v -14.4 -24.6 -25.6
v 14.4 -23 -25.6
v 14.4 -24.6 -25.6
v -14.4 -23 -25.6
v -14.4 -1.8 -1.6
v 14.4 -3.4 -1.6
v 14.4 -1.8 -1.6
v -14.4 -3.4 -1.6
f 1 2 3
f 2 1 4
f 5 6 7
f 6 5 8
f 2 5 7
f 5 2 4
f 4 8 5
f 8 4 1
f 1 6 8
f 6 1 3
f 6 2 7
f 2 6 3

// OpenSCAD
// file: ../p/4-4edge.scad
use <../lib.scad>
$fa=1; $fs=0.2;
function ldraw_lib__4_4edge(realsolid=false) = [
// 0 Circle 1.0
// 0 Name: 4-4edge.dat
// 0 Author: James Jessiman
// 0 !LDRAW_ORG Primitive UPDATE 2017-01
// 0 !LICENSE Licensed under CC BY 2.0 and CC BY 4.0 : see CAreadme.txt
// 
// 0 BFC CERTIFY CCW
  [0,"BFC","CERTIFY"],
  [0,"BFC","CCW"],
// 
// 0 !HISTORY 1998-12-15 [PTadmin] Official Update 1998-10
// 0 !HISTORY 2005-12-28 [PTadmin] Official Update 2005-01
// 0 !HISTORY 2007-06-24 [PTadmin] Header formatted for Contributor Agreement
// 0 !HISTORY 2008-07-01 [PTadmin] Official Update 2008-01
// 0 !HISTORY 2017-01-15 [Steffen] BFCed
// 0 !HISTORY 2017-12-30 [PTadmin] Official Update 2017-01
// 
// 
// 2 24 1 0 0 0.9239 0 0.3827
  [2,24,1,0,0,0.9239,0,0.3827],
// 2 24 0.9239 0 0.3827 0.7071 0 0.7071
  [2,24,0.9239,0,0.3827,0.7071,0,0.7071],
// 2 24 0.7071 0 0.7071 0.3827 0 0.9239
  [2,24,0.7071,0,0.7071,0.3827,0,0.9239],
// 2 24 0.3827 0 0.9239 0 0 1
  [2,24,0.3827,0,0.9239,0,0,1],
// 2 24 0 0 1 -0.3827 0 0.9239
  [2,24,0,0,1,-0.3827,0,0.9239],
// 2 24 -0.3827 0 0.9239 -0.7071 0 0.7071
  [2,24,-0.3827,0,0.9239,-0.7071,0,0.7071],
// 2 24 -0.7071 0 0.7071 -0.9239 0 0.3827
  [2,24,-0.7071,0,0.7071,-0.9239,0,0.3827],
// 2 24 -0.9239 0 0.3827 -1 0 -0
  [2,24,-0.9239,0,0.3827,-1,0,-0],
// 2 24 -1 0 -0 -0.9239 0 -0.3827
  [2,24,-1,0,-0,-0.9239,0,-0.3827],
// 2 24 -0.9239 0 -0.3827 -0.7071 0 -0.7071
  [2,24,-0.9239,0,-0.3827,-0.7071,0,-0.7071],
// 2 24 -0.7071 0 -0.7071 -0.3827 0 -0.9239
  [2,24,-0.7071,0,-0.7071,-0.3827,0,-0.9239],
// 2 24 -0.3827 0 -0.9239 0 0 -1
  [2,24,-0.3827,0,-0.9239,0,0,-1],
// 2 24 0 0 -1 0.3827 0 -0.9239
  [2,24,0,0,-1,0.3827,0,-0.9239],
// 2 24 0.3827 0 -0.9239 0.7071 0 -0.7071
  [2,24,0.3827,0,-0.9239,0.7071,0,-0.7071],
// 2 24 0.7071 0 -0.7071 0.9239 0 -0.3827
  [2,24,0.7071,0,-0.7071,0.9239,0,-0.3827],
// 2 24 0.9239 0 -0.3827 1 0 0
  [2,24,0.9239,0,-0.3827,1,0,0],
];
module ldraw_lib__4_4edge(step=0, col=false, unit=2/5, alt=false, line=0.2, solid=!$preview)
    makepoly(ldraw_lib__4_4edge(solid), step=step, col=col, unit=unit, alt=alt, line=line, solid=solid);
ldraw_lib__4_4edge(line=0.2);
// file: ../p/4-4disc.scad
use <../lib.scad>
$fa=1; $fs=0.2;
function ldraw_lib__4_4disc(realsolid=false) = [
// 0 Disc 1.0
// 0 Name: 4-4disc.dat
// 0 Author: James Jessiman
// 0 !LDRAW_ORG Primitive UPDATE 2002-02
// 0 !LICENSE Licensed under CC BY 2.0 and CC BY 4.0 : see CAreadme.txt
// 
// 0 BFC CERTIFY CCW
  [0,"BFC","CERTIFY"],
  [0,"BFC","CCW"],
// 
// 0 !HISTORY 1998-12-15 [PTadmin] Official Update 1998-10
// 0 !HISTORY 2002-03-23 [sbliss] Added BFC statement
// 0 !HISTORY 2002-04-25 [PTadmin] Official Update 2002-02
// 0 !HISTORY 2007-06-24 [PTadmin] Header formatted for Contributor Agreement
// 0 !HISTORY 2008-07-01 [PTadmin] Official Update 2008-01
// 
// 
// 3 16 0 0 0 1 0 0 0.9239 0 0.3827
  [3,16,0,0,0,1,0,0,0.9239,0,0.3827],
// 3 16 0 0 0 0.9239 0 0.3827 0.7071 0 0.7071
  [3,16,0,0,0,0.9239,0,0.3827,0.7071,0,0.7071],
// 3 16 0 0 0 0.7071 0 0.7071 0.3827 0 0.9239
  [3,16,0,0,0,0.7071,0,0.7071,0.3827,0,0.9239],
// 3 16 0 0 0 0.3827 0 0.9239 0 0 1
  [3,16,0,0,0,0.3827,0,0.9239,0,0,1],
// 3 16 0 0 0 0 0 1 -0.3827 0 0.9239
  [3,16,0,0,0,0,0,1,-0.3827,0,0.9239],
// 3 16 0 0 0 -0.3827 0 0.9239 -0.7071 0 0.7071
  [3,16,0,0,0,-0.3827,0,0.9239,-0.7071,0,0.7071],
// 3 16 0 0 0 -0.7071 0 0.7071 -0.9239 0 0.3827
  [3,16,0,0,0,-0.7071,0,0.7071,-0.9239,0,0.3827],
// 3 16 0 0 0 -0.9239 0 0.3827 -1 0 -0
  [3,16,0,0,0,-0.9239,0,0.3827,-1,0,-0],
// 3 16 0 0 0 -1 0 -0 -0.9239 0 -0.3827
  [3,16,0,0,0,-1,0,-0,-0.9239,0,-0.3827],
// 3 16 0 0 0 -0.9239 0 -0.3827 -0.7071 0 -0.7071
  [3,16,0,0,0,-0.9239,0,-0.3827,-0.7071,0,-0.7071],
// 3 16 0 0 0 -0.7071 0 -0.7071 -0.3827 0 -0.9239
  [3,16,0,0,0,-0.7071,0,-0.7071,-0.3827,0,-0.9239],
// 3 16 0 0 0 -0.3827 0 -0.9239 0 0 -1
  [3,16,0,0,0,-0.3827,0,-0.9239,0,0,-1],
// 3 16 0 0 0 0 0 -1 0.3827 0 -0.9239
  [3,16,0,0,0,0,0,-1,0.3827,0,-0.9239],
// 3 16 0 0 0 0.3827 0 -0.9239 0.7071 0 -0.7071
  [3,16,0,0,0,0.3827,0,-0.9239,0.7071,0,-0.7071],
// 3 16 0 0 0 0.7071 0 -0.7071 0.9239 0 -0.3827
  [3,16,0,0,0,0.7071,0,-0.7071,0.9239,0,-0.3827],
// 3 16 0 0 0 0.9239 0 -0.3827 1 0 0
  [3,16,0,0,0,0.9239,0,-0.3827,1,0,0],
// 0
];
module ldraw_lib__4_4disc(step=0, col=false, unit=2/5, alt=false, line=0.2, solid=!$preview)
    makepoly(ldraw_lib__4_4disc(solid), step=step, col=col, unit=unit, alt=alt, line=line, solid=solid);
ldraw_lib__4_4disc(line=0.2);
// file: ../p/4-4cyli.scad
use <../lib.scad>
$fa=1; $fs=0.2;
function ldraw_lib__4_4cyli(realsolid=false) = [
// 0 Cylinder 1.0
// 0 Name: 4-4cyli.dat
// 0 Author: James Jessiman
// 0 !LDRAW_ORG Primitive UPDATE 2005-01
// 0 !LICENSE Licensed under CC BY 2.0 and CC BY 4.0 : see CAreadme.txt
// 
// 0 BFC CERTIFY CCW
  [0,"BFC","CERTIFY"],
  [0,"BFC","CCW"],
// 
// 0 !HISTORY 1998-12-15 [PTadmin] Official Update 1998-10
// 0 !HISTORY 2002-03-23 [sbliss] Added BFC statement; merged headers from files in distributions LDraw 0.27 and Complete.
// 0 !HISTORY 2002-04-25 [PTadmin] Official Update 2002-02
// 0 !HISTORY 2004-12-14 [guyvivan] BFC CCW
// 0 !HISTORY 2005-12-28 [PTadmin] Official Update 2005-01
// 0 !HISTORY 2007-06-24 [PTadmin] Header formatted for Contributor Agreement
// 0 !HISTORY 2008-07-01 [PTadmin] Official Update 2008-01
// 
// 
// 4 16 1 1 0 0.9239 1 0.3827 0.9239 0 0.3827 1 0 0
  [4,16,1,1,0,0.9239,1,0.3827,0.9239,0,0.3827,1,0,0],
// 5 24 1 0 0 1 1 0 0.9239 0 0.3827 0.9239 0 -0.3827
  [5,24,1,0,0,1,1,0,0.9239,0,0.3827,0.9239,0,-0.3827],
// 4 16 0.9239 1 0.3827 0.7071 1 0.7071 0.7071 0 0.7071 0.9239 0 0.3827
  [4,16,0.9239,1,0.3827,0.7071,1,0.7071,0.7071,0,0.7071,0.9239,0,0.3827],
// 5 24 0.9239 0 0.3827 0.9239 1 0.3827 0.7071 0 0.7071 1 0 0
  [5,24,0.9239,0,0.3827,0.9239,1,0.3827,0.7071,0,0.7071,1,0,0],
// 4 16 0.7071 1 0.7071 0.3827 1 0.9239 0.3827 0 0.9239 0.7071 0 0.7071
  [4,16,0.7071,1,0.7071,0.3827,1,0.9239,0.3827,0,0.9239,0.7071,0,0.7071],
// 5 24 0.7071 0 0.7071 0.7071 1 0.7071 0.3827 0 0.9239 0.9239 0 0.3827
  [5,24,0.7071,0,0.7071,0.7071,1,0.7071,0.3827,0,0.9239,0.9239,0,0.3827],
// 4 16 0.3827 1 0.9239 0 1 1 0 0 1 0.3827 0 0.9239
  [4,16,0.3827,1,0.9239,0,1,1,0,0,1,0.3827,0,0.9239],
// 5 24 0.3827 0 0.9239 0.3827 1 0.9239 0 0 1 0.7071 0 0.7071
  [5,24,0.3827,0,0.9239,0.3827,1,0.9239,0,0,1,0.7071,0,0.7071],
// 4 16 0 1 1 -0.3827 1 0.9239 -0.3827 0 0.9239 0 0 1
  [4,16,0,1,1,-0.3827,1,0.9239,-0.3827,0,0.9239,0,0,1],
// 5 24 0 0 1 0 1 1 -0.3827 0 0.9239 0.3827 0 0.9239
  [5,24,0,0,1,0,1,1,-0.3827,0,0.9239,0.3827,0,0.9239],
// 4 16 -0.3827 1 0.9239 -0.7071 1 0.7071 -0.7071 0 0.7071 -0.3827 0 0.9239
  [4,16,-0.3827,1,0.9239,-0.7071,1,0.7071,-0.7071,0,0.7071,-0.3827,0,0.9239],
// 5 24 -0.3827 0 0.9239 -0.3827 1 0.9239 -0.7071 0 0.7071 0 0 1
  [5,24,-0.3827,0,0.9239,-0.3827,1,0.9239,-0.7071,0,0.7071,0,0,1],
// 4 16 -0.7071 1 0.7071 -0.9239 1 0.3827 -0.9239 0 0.3827 -0.7071 0 0.7071
  [4,16,-0.7071,1,0.7071,-0.9239,1,0.3827,-0.9239,0,0.3827,-0.7071,0,0.7071],
// 5 24 -0.7071 0 0.7071 -0.7071 1 0.7071 -0.9239 0 0.3827 -0.3827 0 0.9239
  [5,24,-0.7071,0,0.7071,-0.7071,1,0.7071,-0.9239,0,0.3827,-0.3827,0,0.9239],
// 4 16 -0.9239 1 0.3827 -1 1 0 -1 0 0 -0.9239 0 0.3827
  [4,16,-0.9239,1,0.3827,-1,1,0,-1,0,0,-0.9239,0,0.3827],
// 5 24 -0.9239 0 0.3827 -0.9239 1 0.3827 -1 0 0 -0.7071 0 0.7071
  [5,24,-0.9239,0,0.3827,-0.9239,1,0.3827,-1,0,0,-0.7071,0,0.7071],
// 4 16 -1 1 0 -0.9239 1 -0.3827 -0.9239 0 -0.3827 -1 0 0
  [4,16,-1,1,0,-0.9239,1,-0.3827,-0.9239,0,-0.3827,-1,0,0],
// 5 24 -1 0 0 -1 1 0 -0.9239 0 -0.3827 -0.9239 0 0.3827
  [5,24,-1,0,0,-1,1,0,-0.9239,0,-0.3827,-0.9239,0,0.3827],
// 4 16 -0.9239 1 -0.3827 -0.7071 1 -0.7071 -0.7071 0 -0.7071 -0.9239 0 -0.3827
  [4,16,-0.9239,1,-0.3827,-0.7071,1,-0.7071,-0.7071,0,-0.7071,-0.9239,0,-0.3827],
// 5 24 -0.9239 0 -0.3827 -0.9239 1 -0.3827 -0.7071 0 -0.7071 -1 0 0
  [5,24,-0.9239,0,-0.3827,-0.9239,1,-0.3827,-0.7071,0,-0.7071,-1,0,0],
// 4 16 -0.7071 1 -0.7071 -0.3827 1 -0.9239 -0.3827 0 -0.9239 -0.7071 0 -0.7071
  [4,16,-0.7071,1,-0.7071,-0.3827,1,-0.9239,-0.3827,0,-0.9239,-0.7071,0,-0.7071],
// 5 24 -0.7071 0 -0.7071 -0.7071 1 -0.7071 -0.3827 0 -0.9239 -0.9239 0 -0.3827
  [5,24,-0.7071,0,-0.7071,-0.7071,1,-0.7071,-0.3827,0,-0.9239,-0.9239,0,-0.3827],
// 4 16 -0.3827 1 -0.9239 0 1 -1 0 0 -1 -0.3827 0 -0.9239
  [4,16,-0.3827,1,-0.9239,0,1,-1,0,0,-1,-0.3827,0,-0.9239],
// 5 24 -0.3827 0 -0.9239 -0.3827 1 -0.9239 0 0 -1 -0.7071 0 -0.7071
  [5,24,-0.3827,0,-0.9239,-0.3827,1,-0.9239,0,0,-1,-0.7071,0,-0.7071],
// 4 16 0 1 -1 0.3827 1 -0.9239 0.3827 0 -0.9239 0 0 -1
  [4,16,0,1,-1,0.3827,1,-0.9239,0.3827,0,-0.9239,0,0,-1],
// 5 24 0 0 -1 0 1 -1 0.3827 0 -0.9239 -0.3827 0 -0.9239
  [5,24,0,0,-1,0,1,-1,0.3827,0,-0.9239,-0.3827,0,-0.9239],
// 4 16 0.3827 1 -0.9239 0.7071 1 -0.7071 0.7071 0 -0.7071 0.3827 0 -0.9239
  [4,16,0.3827,1,-0.9239,0.7071,1,-0.7071,0.7071,0,-0.7071,0.3827,0,-0.9239],
// 5 24 0.3827 0 -0.9239 0.3827 1 -0.9239 0.7071 0 -0.7071 0 0 -1
  [5,24,0.3827,0,-0.9239,0.3827,1,-0.9239,0.7071,0,-0.7071,0,0,-1],
// 4 16 0.7071 1 -0.7071 0.9239 1 -0.3827 0.9239 0 -0.3827 0.7071 0 -0.7071
  [4,16,0.7071,1,-0.7071,0.9239,1,-0.3827,0.9239,0,-0.3827,0.7071,0,-0.7071],
// 5 24 0.7071 0 -0.7071 0.7071 1 -0.7071 0.9239 0 -0.3827 0.3827 0 -0.9239
  [5,24,0.7071,0,-0.7071,0.7071,1,-0.7071,0.9239,0,-0.3827,0.3827,0,-0.9239],
// 4 16 0.9239 1 -0.3827 1 1 0 1 0 0 0.9239 0 -0.3827
  [4,16,0.9239,1,-0.3827,1,1,0,1,0,0,0.9239,0,-0.3827],
// 5 24 0.9239 0 -0.3827 0.9239 1 -0.3827 1 0 0 0.7071 0 -0.7071
  [5,24,0.9239,0,-0.3827,0.9239,1,-0.3827,1,0,0,0.7071,0,-0.7071],
// 0
];
module ldraw_lib__4_4cyli(step=0, col=false, unit=2/5, alt=false, line=0.2, solid=!$preview)
    makepoly(ldraw_lib__4_4cyli(solid), step=step, col=col, unit=unit, alt=alt, line=line, solid=solid);
ldraw_lib__4_4cyli(line=0.2);
// file: ../p/stud3.scad
use <../lib.scad>
use <4-4cyli.scad>
use <4-4disc.scad>
use <4-4edge.scad>
$fa=1; $fs=0.2;
function ldraw_lib__stud3(realsolid=false) = realsolid ? 
    [openscad(translate([0,0,-eps()], o=cylinder(4+eps(), r=4)),2)] : [
// 0 Stud Tube Solid
// 0 Name: stud3.dat
// 0 Author: James Jessiman
// 0 !LDRAW_ORG Primitive UPDATE 2012-01
// 0 !LICENSE Licensed under CC BY 2.0 and CC BY 4.0 : see CAreadme.txt
// 
// 0 BFC CERTIFY CCW
  [0,"BFC","CERTIFY"],
  [0,"BFC","CCW"],
// 
// 0 !HISTORY 2002-04-04 [sbliss] Modified for BFC compliance
// 0 !HISTORY 2002-04-25 [PTadmin] Official Update 2002-02
// 0 !HISTORY 2007-06-24 [PTadmin] Header formatted for Contributor Agreement
// 0 !HISTORY 2008-07-01 [PTadmin] Official Update 2008-01
// 0 !HISTORY 2012-02-16 [Philo] Changed to CCW
// 0 !HISTORY 2012-03-30 [PTadmin] Official Update 2012-01
// 
// 
// 1 16 0 -4 0 4 0 0 0 1 0 0 0 4 4-4edge.dat
  [1,16,0,-4,0,4,0,0,0,1,0,0,0,4, ldraw_lib__4_4edge(realsolid)],
// 1 16 0 0 0 4 0 0 0 1 0 0 0 4 4-4edge.dat
  [1,16,0,0,0,4,0,0,0,1,0,0,0,4, ldraw_lib__4_4edge(realsolid)],
// 1 16 0 -4 0 4 0 0 0 1 0 0 0 4 4-4disc.dat
  [1,16,0,-4,0,4,0,0,0,1,0,0,0,4, ldraw_lib__4_4disc(realsolid)],
// 1 16 0 -4 0 4 0 0 0 4 0 0 0 4 4-4cyli.dat
  [1,16,0,-4,0,4,0,0,0,4,0,0,0,4, ldraw_lib__4_4cyli(realsolid)],
];
module ldraw_lib__stud3(step=0, col=false, unit=2/5, alt=false, line=0.2, solid=!$preview)
    makepoly(ldraw_lib__stud3(solid), step=step, col=col, unit=unit, alt=alt, line=line, solid=solid);
ldraw_lib__stud3(line=0.2);
// file: ../p/stud.scad
use <../lib.scad>
use <4-4cyli.scad>
use <4-4disc.scad>
use <4-4edge.scad>
$fa=1; $fs=0.2;
function ldraw_lib__stud(realsolid=false) = realsolid ? 
    [openscad(translate([0,0,-eps()], o=cylinder(4+eps(), r=6)),2)] : [
// 0 Stud
// 0 Name: stud.dat
// 0 Author: James Jessiman
// 0 !LDRAW_ORG Primitive UPDATE 2012-01
// 0 !LICENSE Licensed under CC BY 2.0 and CC BY 4.0 : see CAreadme.txt
// 
// 0 BFC CERTIFY CCW
  [0,"BFC","CERTIFY"],
  [0,"BFC","CCW"],
// 
// 0 !HISTORY 2002-04-04 [sbliss] Modified for BFC compliance
// 0 !HISTORY 2002-04-25 [PTadmin] Official Update 2002-02
// 0 !HISTORY 2007-06-24 [PTadmin] Header formatted for Contributor Agreement
// 0 !HISTORY 2008-07-01 [PTadmin] Official Update 2008-01
// 0 !HISTORY 2012-02-16 [Philo] Changed to CCW
// 0 !HISTORY 2012-03-30 [PTadmin] Official Update 2012-01
// 
// 
// 1 16 0 0 0 6 0 0 0 1 0 0 0 6 4-4edge.dat
  [1,16,0,0,0,6,0,0,0,1,0,0,0,6, ldraw_lib__4_4edge(realsolid)],
// 1 16 0 -4 0 6 0 0 0 1 0 0 0 6 4-4edge.dat
  [1,16,0,-4,0,6,0,0,0,1,0,0,0,6, ldraw_lib__4_4edge(realsolid)],
// 1 16 0 0 0 6 0 0 0 -4 0 0 0 6 4-4cyli.dat
  [1,16,0,0,0,6,0,0,0,-4,0,0,0,6, ldraw_lib__4_4cyli(realsolid)],
// 1 16 0 -4 0 6 0 0 0 1 0 0 0 6 4-4disc.dat
  [1,16,0,-4,0,6,0,0,0,1,0,0,0,6, ldraw_lib__4_4disc(realsolid)],
];
module ldraw_lib__stud(step=0, col=false, unit=2/5, alt=false, line=0.2, solid=!$preview)
    makepoly(ldraw_lib__stud(solid), step=step, col=col, unit=unit, alt=alt, line=line, solid=solid);
ldraw_lib__stud(line=0.2);
// file: ../p/box5.scad
use <../lib.scad>
$fa=1; $fs=0.2;
function ldraw_lib__box5(realsolid=false) = [
// 0 Box with 5 Faces and All Edges
// 0 Name: box5.dat
// 0 Author: James Jessiman
// 0 !LDRAW_ORG Primitive UPDATE 2012-01
// 0 !LICENSE Licensed under CC BY 2.0 and CC BY 4.0 : see CAreadme.txt
// 
// 0 BFC CERTIFY CCW
  [0,"BFC","CERTIFY"],
  [0,"BFC","CCW"],
// 
// 0 !HISTORY 2002-04-03 [sbliss] Modified for BFC compliance
// 0 !HISTORY 2002-04-25 [PTadmin] Official Update 2002-02
// 0 !HISTORY 2007-06-24 [PTadmin] Header formatted for Contributor Agreement
// 0 !HISTORY 2008-07-01 [PTadmin] Official Update 2008-01
// 0 !HISTORY 2012-02-16 [Philo] Changed to CCW
// 0 !HISTORY 2012-03-30 [PTadmin] Official Update 2012-01
// 
// 
// 2 24 1 1 1 -1 1 1
  [2,24,1,1,1,-1,1,1],
// 2 24 -1 1 1 -1 1 -1
  [2,24,-1,1,1,-1,1,-1],
// 2 24 -1 1 -1 1 1 -1
  [2,24,-1,1,-1,1,1,-1],
// 2 24 1 1 -1 1 1 1
  [2,24,1,1,-1,1,1,1],
// 2 24 1 0 1 -1 0 1
  [2,24,1,0,1,-1,0,1],
// 2 24 -1 0 1 -1 0 -1
  [2,24,-1,0,1,-1,0,-1],
// 2 24 -1 0 -1 1 0 -1
  [2,24,-1,0,-1,1,0,-1],
// 2 24 1 0 -1 1 0 1
  [2,24,1,0,-1,1,0,1],
// 2 24 1 0 1 1 1 1
  [2,24,1,0,1,1,1,1],
// 2 24 -1 0 1 -1 1 1
  [2,24,-1,0,1,-1,1,1],
// 2 24 1 0 -1 1 1 -1
  [2,24,1,0,-1,1,1,-1],
// 2 24 -1 0 -1 -1 1 -1
  [2,24,-1,0,-1,-1,1,-1],
// 4 16 -1 1 1 1 1 1 1 1 -1 -1 1 -1
  [4,16,-1,1,1,1,1,1,1,1,-1,-1,1,-1],
// 4 16 -1 1 1 -1 0 1 1 0 1 1 1 1
  [4,16,-1,1,1,-1,0,1,1,0,1,1,1,1],
// 4 16 -1 1 -1 -1 0 -1 -1 0 1 -1 1 1
  [4,16,-1,1,-1,-1,0,-1,-1,0,1,-1,1,1],
// 4 16 1 1 -1 1 0 -1 -1 0 -1 -1 1 -1
  [4,16,1,1,-1,1,0,-1,-1,0,-1,-1,1,-1],
// 4 16 1 1 1 1 0 1 1 0 -1 1 1 -1
  [4,16,1,1,1,1,0,1,1,0,-1,1,1,-1],
];
module ldraw_lib__box5(step=0, col=false, unit=2/5, alt=false, line=0.2, solid=!$preview)
    makepoly(ldraw_lib__box5(solid), step=step, col=col, unit=unit, alt=alt, line=line, solid=solid);
ldraw_lib__box5(line=0.2);
// file: ../p/box4t.scad
use <../lib.scad>
$fa=1; $fs=0.2;
function ldraw_lib__box4t(realsolid=false) = [
// 0 Box with 4 Adjacent Faces and All Edges
// 0 Name: box4t.dat
// 0 Author: Tore Eriksson [Tore_Eriksson]
// 0 !LDRAW_ORG Primitive UPDATE 2003-02
// 0 !LICENSE Licensed under CC BY 2.0 and CC BY 4.0 : see CAreadme.txt
// 
// 0 BFC CERTIFY CCW
  [0,"BFC","CERTIFY"],
  [0,"BFC","CCW"],
// 
// 0 !HISTORY 1997-09-29 [PTadmin] Official Update 1997-15
// 0 !HISTORY 2002-08-31 [izanette] Modified with WINDZ for BFC compliance
// 0 !HISTORY 2003-08-01 [PTadmin] Official Update 2003-02
// 0 !HISTORY 2007-06-24 [PTadmin] Header formatted for Contributor Agreement
// 0 !HISTORY 2008-07-01 [PTadmin] Official Update 2008-01
// 
// 
// 2 24 1 1 1 -1 1 1
  [2,24,1,1,1,-1,1,1],
// 2 24 -1 1 1 -1 1 -1
  [2,24,-1,1,1,-1,1,-1],
// 2 24 -1 1 -1 1 1 -1
  [2,24,-1,1,-1,1,1,-1],
// 2 24 1 1 -1 1 1 1
  [2,24,1,1,-1,1,1,1],
// 2 24 1 0 1 -1 0 1
  [2,24,1,0,1,-1,0,1],
// 2 24 -1 0 1 -1 0 -1
  [2,24,-1,0,1,-1,0,-1],
// 2 24 -1 0 -1 1 0 -1
  [2,24,-1,0,-1,1,0,-1],
// 2 24 1 0 -1 1 0 1
  [2,24,1,0,-1,1,0,1],
// 2 24 1 0 1 1 1 1
  [2,24,1,0,1,1,1,1],
// 2 24 -1 0 1 -1 1 1
  [2,24,-1,0,1,-1,1,1],
// 2 24 1 0 -1 1 1 -1
  [2,24,1,0,-1,1,1,-1],
// 2 24 -1 0 -1 -1 1 -1
  [2,24,-1,0,-1,-1,1,-1],
// 4 16 1 1 1 1 1 -1 -1 1 -1 -1 1 1
  [4,16,1,1,1,1,1,-1,-1,1,-1,-1,1,1],
// 4 16 1 1 1 -1 1 1 -1 0 1 1 0 1
  [4,16,1,1,1,-1,1,1,-1,0,1,1,0,1],
// 4 16 -1 1 1 -1 1 -1 -1 0 -1 -1 0 1
  [4,16,-1,1,1,-1,1,-1,-1,0,-1,-1,0,1],
// 0 4 16 -1 1 -1 -1 0 -1 1 0 -1 1 1 -1
// 4 16 1 1 -1 1 1 1 1 0 1 1 0 -1
  [4,16,1,1,-1,1,1,1,1,0,1,1,0,-1],
// 0
];
module ldraw_lib__box4t(step=0, col=false, unit=2/5, alt=false, line=0.2, solid=!$preview)
    makepoly(ldraw_lib__box4t(solid), step=step, col=col, unit=unit, alt=alt, line=line, solid=solid);
ldraw_lib__box4t(line=0.2);
// file: s/3004s01.scad
use <../../lib.scad>
use <../../p/box4t.scad>
use <../../p/box5.scad>
use <../../p/stud.scad>
use <../../p/stud3.scad>
$fa=1; $fs=0.2;
function ldraw_lib__s__3004s01(realsolid=false) = [
// 0 ~Brick  1 x  2 without Front Face
// 0 Name: s\3004s01.dat
// 0 Author: James Jessiman
// 0 !LDRAW_ORG Subpart UPDATE 2003-03
// 0 !LICENSE Licensed under CC BY 2.0 and CC BY 4.0 : see CAreadme.txt
// 
// 0 BFC CERTIFY CCW
  [0,"BFC","CERTIFY"],
  [0,"BFC","CCW"],
// 
// 0 !HISTORY 2003-09-07 [jriley] Subfiling, BFC
// 0 !HISTORY 2003-12-19 [PTadmin] Official Update 2003-03
// 0 !HISTORY 2007-08-29 [PTadmin] Header formatted for Contributor Agreement
// 0 !HISTORY 2008-07-01 [PTadmin] Official Update 2008-01
// 
// 
// 1 16 0 4 0 1 0 0 0 -5 0 0 0 1 stud3.dat
  [1,16,0,4,0,1,0,0,0,-5,0,0,0,1, ldraw_lib__stud3(realsolid)],
// 0 BFC INVERTNEXT
  [0,"BFC","INVERTNEXT"],
// 1 16 0 24 0 16 0 0 0 -20 0 0 0 6 box5.dat
  [1,16,0,24,0,16,0,0,0,-20,0,0,0,6, ldraw_lib__box5(realsolid)],
// 4 16 20 24 10 16 24 6 -16 24 6 -20 24 10
  [4,16,20,24,10,16,24,6,-16,24,6,-20,24,10],
// 4 16 -20 24 10 -16 24 6 -16 24 -6 -20 24 -10
  [4,16,-20,24,10,-16,24,6,-16,24,-6,-20,24,-10],
// 4 16 -20 24 -10 -16 24 -6 16 24 -6 20 24 -10
  [4,16,-20,24,-10,-16,24,-6,16,24,-6,20,24,-10],
// 4 16 20 24 -10 16 24 -6 16 24 6 20 24 10
  [4,16,20,24,-10,16,24,-6,16,24,6,20,24,10],
// 1 16 0 24 0 20 0 0 0 -24 0 0 0 10 box4t.dat
  [1,16,0,24,0,20,0,0,0,-24,0,0,0,10, ldraw_lib__box4t(realsolid)],
// 1 16 10 0 0 1 0 0 0 1 0 0 0 1 stud.dat
  [1,16,10,0,0,1,0,0,0,1,0,0,0,1, ldraw_lib__stud(realsolid)],
// 1 16 -10 0 0 1 0 0 0 1 0 0 0 1 stud.dat
  [1,16,-10,0,0,1,0,0,0,1,0,0,0,1, ldraw_lib__stud(realsolid)],
// 0
];
module ldraw_lib__s__3004s01(step=0, col=false, unit=2/5, alt=false, line=0.2, solid=!$preview)
    makepoly(ldraw_lib__s__3004s01(solid), step=step, col=col, unit=unit, alt=alt, line=line, solid=solid);
ldraw_lib__s__3004s01(line=0.2);
// file: 3004.scad
use <../lib.scad>
use <s/3004s01.scad>
$fa=1; $fs=0.2;
function ldraw_lib__3004(realsolid=false) = [
// 0 Brick  1 x  2
// 0 Name: 3004.dat
// 0 Author: James Jessiman
// 0 !LDRAW_ORG Part UPDATE 2022-05
// 0 !LICENSE Licensed under CC BY 2.0 and CC BY 4.0 : see CAreadme.txt
// 
// 0 BFC CERTIFY CCW
  [0,"BFC","CERTIFY"],
  [0,"BFC","CCW"],
// 
// 0 !HISTORY 2001-10-26 [PTadmin] Official Update 2001-01
// 0 !HISTORY 2002-05-07 {unknown} BFC Certification
// 0 !HISTORY 2002-06-11 [PTadmin] Official Update 2002-03
// 0 !HISTORY 2007-05-07 [PTadmin] Header formatted for Contributor Agreement
// 0 !HISTORY 2008-07-01 [PTadmin] Official Update 2008-01
// 0 !HISTORY 2022-08-04 [MagFors] Using subfile
// 0 !HISTORY 2022-09-15 [PTadmin] Official Update 2022-05
// 
// 
// 1 16 0 0 0 1 0 0 0 1 0 0 0 1 s\3004s01.dat
  [1,16,0,0,0,1,0,0,0,1,0,0,0,1, ldraw_lib__s__3004s01(realsolid)],
// 4 16 -20 24 -10 20 24 -10 20 0 -10 -20 0 -10
  [4,16,-20,24,-10,20,24,-10,20,0,-10,-20,0,-10],
];
module ldraw_lib__3004(step=0, col=false, unit=2/5, alt=false, line=0.2, solid=!$preview)
    makepoly(ldraw_lib__3004(solid), step=step, col=col, unit=unit, alt=alt, line=line, solid=solid);
ldraw_lib__3004(line=0.2);
// file: ../p/box.scad
use <../lib.scad>
$fa=1; $fs=0.2;
function ldraw_lib__box(realsolid=false) = [
// 0 Box 6 (six faces)
// 0 Name: box.dat
// 0 Author: James Jessiman
// 0 !LDRAW_ORG Primitive UPDATE 2002-05
// 0 !LICENSE Licensed under CC BY 2.0 and CC BY 4.0 : see CAreadme.txt
// 
// 0 BFC CERTIFY CCW
  [0,"BFC","CERTIFY"],
  [0,"BFC","CCW"],
// 
// 0 !HISTORY 2002-08-22 [sbliss] Applied BFC
// 0 !HISTORY 2002-11-30 [PTadmin] Official Update 2002-05
// 0 !HISTORY 2007-06-24 [PTadmin] Header formatted for Contributor Agreement
// 0 !HISTORY 2008-07-01 [PTadmin] Official Update 2008-01
// 
// 
// 2 24 1 1 1 -1 1 1
  [2,24,1,1,1,-1,1,1],
// 2 24 -1 1 1 -1 1 -1
  [2,24,-1,1,1,-1,1,-1],
// 2 24 -1 1 -1 1 1 -1
  [2,24,-1,1,-1,1,1,-1],
// 2 24 1 1 -1 1 1 1
  [2,24,1,1,-1,1,1,1],
// 2 24 1 -1 1 -1 -1 1
  [2,24,1,-1,1,-1,-1,1],
// 2 24 -1 -1 1 -1 -1 -1
  [2,24,-1,-1,1,-1,-1,-1],
// 2 24 -1 -1 -1 1 -1 -1
  [2,24,-1,-1,-1,1,-1,-1],
// 2 24 1 -1 -1 1 -1 1
  [2,24,1,-1,-1,1,-1,1],
// 2 24 1 -1 1 1 1 1
  [2,24,1,-1,1,1,1,1],
// 2 24 -1 -1 1 -1 1 1
  [2,24,-1,-1,1,-1,1,1],
// 2 24 1 -1 -1 1 1 -1
  [2,24,1,-1,-1,1,1,-1],
// 2 24 -1 -1 -1 -1 1 -1
  [2,24,-1,-1,-1,-1,1,-1],
// 4 16 1 1 1 1 1 -1 -1 1 -1 -1 1 1
  [4,16,1,1,1,1,1,-1,-1,1,-1,-1,1,1],
// 4 16 -1 -1 -1 1 -1 -1 1 -1 1 -1 -1 1
  [4,16,-1,-1,-1,1,-1,-1,1,-1,1,-1,-1,1],
// 4 16 -1 -1 1 1 -1 1 1 1 1 -1 1 1
  [4,16,-1,-1,1,1,-1,1,1,1,1,-1,1,1],
// 4 16 -1 -1 -1 -1 -1 1 -1 1 1 -1 1 -1
  [4,16,-1,-1,-1,-1,-1,1,-1,1,1,-1,1,-1],
// 4 16 1 -1 -1 -1 -1 -1 -1 1 -1 1 1 -1
  [4,16,1,-1,-1,-1,-1,-1,-1,1,-1,1,1,-1],
// 4 16 1 -1 1 1 -1 -1 1 1 -1 1 1 1
  [4,16,1,-1,1,1,-1,-1,1,1,-1,1,1,1],
// 0
];
module ldraw_lib__box(step=0, col=false, unit=2/5, alt=false, line=0.2, solid=!$preview)
    makepoly(ldraw_lib__box(solid), step=step, col=col, unit=unit, alt=alt, line=line, solid=solid);
ldraw_lib__box(line=0.2);
// main file
use <../lib.scad>
use <../p/box.scad>
$fa=1; $fs=0.2;
function ldraw_lib__6164(realsolid=false) = [
// 0 ~Glass for Window  4 x  4 x  3 Roof with Centre Bar
// 0 Name: 6164.dat
// 0 Author: Magnus Forsberg [MagFors]
// 0 !LDRAW_ORG Part UPDATE 2016-01
// 0 !LICENSE Licensed under CC BY 2.0 and CC BY 4.0 : see CAreadme.txt
// 
// 0 BFC CERTIFY CCW
  [0,"BFC","CERTIFY"],
  [0,"BFC","CCW"],
// 
// 0 !HISTORY 2015-01-01 [MagFors] Original part shape by Thomas Burger
// 0 !HISTORY 2015-01-03 [MagFors] Reworked
// 0 !HISTORY 2016-12-31 [PTadmin] Official Update 2016-01
// 
// 
// 1 16 0 34 -33 36 0 0 0 30 0 0 -26.5 2 box.dat
  [1,16,0,34,-33,36,0,0,0,30,0,0,-26.5,2, ldraw_lib__box(realsolid)],
];
module ldraw_lib__6164(step=0, col=false, unit=2/5, alt=false, line=0.2, solid=!$preview)
    makepoly(ldraw_lib__6164(solid), step=step, col=col, unit=unit, alt=alt, line=line, solid=solid);
ldraw_lib__6164(line=0.2);
